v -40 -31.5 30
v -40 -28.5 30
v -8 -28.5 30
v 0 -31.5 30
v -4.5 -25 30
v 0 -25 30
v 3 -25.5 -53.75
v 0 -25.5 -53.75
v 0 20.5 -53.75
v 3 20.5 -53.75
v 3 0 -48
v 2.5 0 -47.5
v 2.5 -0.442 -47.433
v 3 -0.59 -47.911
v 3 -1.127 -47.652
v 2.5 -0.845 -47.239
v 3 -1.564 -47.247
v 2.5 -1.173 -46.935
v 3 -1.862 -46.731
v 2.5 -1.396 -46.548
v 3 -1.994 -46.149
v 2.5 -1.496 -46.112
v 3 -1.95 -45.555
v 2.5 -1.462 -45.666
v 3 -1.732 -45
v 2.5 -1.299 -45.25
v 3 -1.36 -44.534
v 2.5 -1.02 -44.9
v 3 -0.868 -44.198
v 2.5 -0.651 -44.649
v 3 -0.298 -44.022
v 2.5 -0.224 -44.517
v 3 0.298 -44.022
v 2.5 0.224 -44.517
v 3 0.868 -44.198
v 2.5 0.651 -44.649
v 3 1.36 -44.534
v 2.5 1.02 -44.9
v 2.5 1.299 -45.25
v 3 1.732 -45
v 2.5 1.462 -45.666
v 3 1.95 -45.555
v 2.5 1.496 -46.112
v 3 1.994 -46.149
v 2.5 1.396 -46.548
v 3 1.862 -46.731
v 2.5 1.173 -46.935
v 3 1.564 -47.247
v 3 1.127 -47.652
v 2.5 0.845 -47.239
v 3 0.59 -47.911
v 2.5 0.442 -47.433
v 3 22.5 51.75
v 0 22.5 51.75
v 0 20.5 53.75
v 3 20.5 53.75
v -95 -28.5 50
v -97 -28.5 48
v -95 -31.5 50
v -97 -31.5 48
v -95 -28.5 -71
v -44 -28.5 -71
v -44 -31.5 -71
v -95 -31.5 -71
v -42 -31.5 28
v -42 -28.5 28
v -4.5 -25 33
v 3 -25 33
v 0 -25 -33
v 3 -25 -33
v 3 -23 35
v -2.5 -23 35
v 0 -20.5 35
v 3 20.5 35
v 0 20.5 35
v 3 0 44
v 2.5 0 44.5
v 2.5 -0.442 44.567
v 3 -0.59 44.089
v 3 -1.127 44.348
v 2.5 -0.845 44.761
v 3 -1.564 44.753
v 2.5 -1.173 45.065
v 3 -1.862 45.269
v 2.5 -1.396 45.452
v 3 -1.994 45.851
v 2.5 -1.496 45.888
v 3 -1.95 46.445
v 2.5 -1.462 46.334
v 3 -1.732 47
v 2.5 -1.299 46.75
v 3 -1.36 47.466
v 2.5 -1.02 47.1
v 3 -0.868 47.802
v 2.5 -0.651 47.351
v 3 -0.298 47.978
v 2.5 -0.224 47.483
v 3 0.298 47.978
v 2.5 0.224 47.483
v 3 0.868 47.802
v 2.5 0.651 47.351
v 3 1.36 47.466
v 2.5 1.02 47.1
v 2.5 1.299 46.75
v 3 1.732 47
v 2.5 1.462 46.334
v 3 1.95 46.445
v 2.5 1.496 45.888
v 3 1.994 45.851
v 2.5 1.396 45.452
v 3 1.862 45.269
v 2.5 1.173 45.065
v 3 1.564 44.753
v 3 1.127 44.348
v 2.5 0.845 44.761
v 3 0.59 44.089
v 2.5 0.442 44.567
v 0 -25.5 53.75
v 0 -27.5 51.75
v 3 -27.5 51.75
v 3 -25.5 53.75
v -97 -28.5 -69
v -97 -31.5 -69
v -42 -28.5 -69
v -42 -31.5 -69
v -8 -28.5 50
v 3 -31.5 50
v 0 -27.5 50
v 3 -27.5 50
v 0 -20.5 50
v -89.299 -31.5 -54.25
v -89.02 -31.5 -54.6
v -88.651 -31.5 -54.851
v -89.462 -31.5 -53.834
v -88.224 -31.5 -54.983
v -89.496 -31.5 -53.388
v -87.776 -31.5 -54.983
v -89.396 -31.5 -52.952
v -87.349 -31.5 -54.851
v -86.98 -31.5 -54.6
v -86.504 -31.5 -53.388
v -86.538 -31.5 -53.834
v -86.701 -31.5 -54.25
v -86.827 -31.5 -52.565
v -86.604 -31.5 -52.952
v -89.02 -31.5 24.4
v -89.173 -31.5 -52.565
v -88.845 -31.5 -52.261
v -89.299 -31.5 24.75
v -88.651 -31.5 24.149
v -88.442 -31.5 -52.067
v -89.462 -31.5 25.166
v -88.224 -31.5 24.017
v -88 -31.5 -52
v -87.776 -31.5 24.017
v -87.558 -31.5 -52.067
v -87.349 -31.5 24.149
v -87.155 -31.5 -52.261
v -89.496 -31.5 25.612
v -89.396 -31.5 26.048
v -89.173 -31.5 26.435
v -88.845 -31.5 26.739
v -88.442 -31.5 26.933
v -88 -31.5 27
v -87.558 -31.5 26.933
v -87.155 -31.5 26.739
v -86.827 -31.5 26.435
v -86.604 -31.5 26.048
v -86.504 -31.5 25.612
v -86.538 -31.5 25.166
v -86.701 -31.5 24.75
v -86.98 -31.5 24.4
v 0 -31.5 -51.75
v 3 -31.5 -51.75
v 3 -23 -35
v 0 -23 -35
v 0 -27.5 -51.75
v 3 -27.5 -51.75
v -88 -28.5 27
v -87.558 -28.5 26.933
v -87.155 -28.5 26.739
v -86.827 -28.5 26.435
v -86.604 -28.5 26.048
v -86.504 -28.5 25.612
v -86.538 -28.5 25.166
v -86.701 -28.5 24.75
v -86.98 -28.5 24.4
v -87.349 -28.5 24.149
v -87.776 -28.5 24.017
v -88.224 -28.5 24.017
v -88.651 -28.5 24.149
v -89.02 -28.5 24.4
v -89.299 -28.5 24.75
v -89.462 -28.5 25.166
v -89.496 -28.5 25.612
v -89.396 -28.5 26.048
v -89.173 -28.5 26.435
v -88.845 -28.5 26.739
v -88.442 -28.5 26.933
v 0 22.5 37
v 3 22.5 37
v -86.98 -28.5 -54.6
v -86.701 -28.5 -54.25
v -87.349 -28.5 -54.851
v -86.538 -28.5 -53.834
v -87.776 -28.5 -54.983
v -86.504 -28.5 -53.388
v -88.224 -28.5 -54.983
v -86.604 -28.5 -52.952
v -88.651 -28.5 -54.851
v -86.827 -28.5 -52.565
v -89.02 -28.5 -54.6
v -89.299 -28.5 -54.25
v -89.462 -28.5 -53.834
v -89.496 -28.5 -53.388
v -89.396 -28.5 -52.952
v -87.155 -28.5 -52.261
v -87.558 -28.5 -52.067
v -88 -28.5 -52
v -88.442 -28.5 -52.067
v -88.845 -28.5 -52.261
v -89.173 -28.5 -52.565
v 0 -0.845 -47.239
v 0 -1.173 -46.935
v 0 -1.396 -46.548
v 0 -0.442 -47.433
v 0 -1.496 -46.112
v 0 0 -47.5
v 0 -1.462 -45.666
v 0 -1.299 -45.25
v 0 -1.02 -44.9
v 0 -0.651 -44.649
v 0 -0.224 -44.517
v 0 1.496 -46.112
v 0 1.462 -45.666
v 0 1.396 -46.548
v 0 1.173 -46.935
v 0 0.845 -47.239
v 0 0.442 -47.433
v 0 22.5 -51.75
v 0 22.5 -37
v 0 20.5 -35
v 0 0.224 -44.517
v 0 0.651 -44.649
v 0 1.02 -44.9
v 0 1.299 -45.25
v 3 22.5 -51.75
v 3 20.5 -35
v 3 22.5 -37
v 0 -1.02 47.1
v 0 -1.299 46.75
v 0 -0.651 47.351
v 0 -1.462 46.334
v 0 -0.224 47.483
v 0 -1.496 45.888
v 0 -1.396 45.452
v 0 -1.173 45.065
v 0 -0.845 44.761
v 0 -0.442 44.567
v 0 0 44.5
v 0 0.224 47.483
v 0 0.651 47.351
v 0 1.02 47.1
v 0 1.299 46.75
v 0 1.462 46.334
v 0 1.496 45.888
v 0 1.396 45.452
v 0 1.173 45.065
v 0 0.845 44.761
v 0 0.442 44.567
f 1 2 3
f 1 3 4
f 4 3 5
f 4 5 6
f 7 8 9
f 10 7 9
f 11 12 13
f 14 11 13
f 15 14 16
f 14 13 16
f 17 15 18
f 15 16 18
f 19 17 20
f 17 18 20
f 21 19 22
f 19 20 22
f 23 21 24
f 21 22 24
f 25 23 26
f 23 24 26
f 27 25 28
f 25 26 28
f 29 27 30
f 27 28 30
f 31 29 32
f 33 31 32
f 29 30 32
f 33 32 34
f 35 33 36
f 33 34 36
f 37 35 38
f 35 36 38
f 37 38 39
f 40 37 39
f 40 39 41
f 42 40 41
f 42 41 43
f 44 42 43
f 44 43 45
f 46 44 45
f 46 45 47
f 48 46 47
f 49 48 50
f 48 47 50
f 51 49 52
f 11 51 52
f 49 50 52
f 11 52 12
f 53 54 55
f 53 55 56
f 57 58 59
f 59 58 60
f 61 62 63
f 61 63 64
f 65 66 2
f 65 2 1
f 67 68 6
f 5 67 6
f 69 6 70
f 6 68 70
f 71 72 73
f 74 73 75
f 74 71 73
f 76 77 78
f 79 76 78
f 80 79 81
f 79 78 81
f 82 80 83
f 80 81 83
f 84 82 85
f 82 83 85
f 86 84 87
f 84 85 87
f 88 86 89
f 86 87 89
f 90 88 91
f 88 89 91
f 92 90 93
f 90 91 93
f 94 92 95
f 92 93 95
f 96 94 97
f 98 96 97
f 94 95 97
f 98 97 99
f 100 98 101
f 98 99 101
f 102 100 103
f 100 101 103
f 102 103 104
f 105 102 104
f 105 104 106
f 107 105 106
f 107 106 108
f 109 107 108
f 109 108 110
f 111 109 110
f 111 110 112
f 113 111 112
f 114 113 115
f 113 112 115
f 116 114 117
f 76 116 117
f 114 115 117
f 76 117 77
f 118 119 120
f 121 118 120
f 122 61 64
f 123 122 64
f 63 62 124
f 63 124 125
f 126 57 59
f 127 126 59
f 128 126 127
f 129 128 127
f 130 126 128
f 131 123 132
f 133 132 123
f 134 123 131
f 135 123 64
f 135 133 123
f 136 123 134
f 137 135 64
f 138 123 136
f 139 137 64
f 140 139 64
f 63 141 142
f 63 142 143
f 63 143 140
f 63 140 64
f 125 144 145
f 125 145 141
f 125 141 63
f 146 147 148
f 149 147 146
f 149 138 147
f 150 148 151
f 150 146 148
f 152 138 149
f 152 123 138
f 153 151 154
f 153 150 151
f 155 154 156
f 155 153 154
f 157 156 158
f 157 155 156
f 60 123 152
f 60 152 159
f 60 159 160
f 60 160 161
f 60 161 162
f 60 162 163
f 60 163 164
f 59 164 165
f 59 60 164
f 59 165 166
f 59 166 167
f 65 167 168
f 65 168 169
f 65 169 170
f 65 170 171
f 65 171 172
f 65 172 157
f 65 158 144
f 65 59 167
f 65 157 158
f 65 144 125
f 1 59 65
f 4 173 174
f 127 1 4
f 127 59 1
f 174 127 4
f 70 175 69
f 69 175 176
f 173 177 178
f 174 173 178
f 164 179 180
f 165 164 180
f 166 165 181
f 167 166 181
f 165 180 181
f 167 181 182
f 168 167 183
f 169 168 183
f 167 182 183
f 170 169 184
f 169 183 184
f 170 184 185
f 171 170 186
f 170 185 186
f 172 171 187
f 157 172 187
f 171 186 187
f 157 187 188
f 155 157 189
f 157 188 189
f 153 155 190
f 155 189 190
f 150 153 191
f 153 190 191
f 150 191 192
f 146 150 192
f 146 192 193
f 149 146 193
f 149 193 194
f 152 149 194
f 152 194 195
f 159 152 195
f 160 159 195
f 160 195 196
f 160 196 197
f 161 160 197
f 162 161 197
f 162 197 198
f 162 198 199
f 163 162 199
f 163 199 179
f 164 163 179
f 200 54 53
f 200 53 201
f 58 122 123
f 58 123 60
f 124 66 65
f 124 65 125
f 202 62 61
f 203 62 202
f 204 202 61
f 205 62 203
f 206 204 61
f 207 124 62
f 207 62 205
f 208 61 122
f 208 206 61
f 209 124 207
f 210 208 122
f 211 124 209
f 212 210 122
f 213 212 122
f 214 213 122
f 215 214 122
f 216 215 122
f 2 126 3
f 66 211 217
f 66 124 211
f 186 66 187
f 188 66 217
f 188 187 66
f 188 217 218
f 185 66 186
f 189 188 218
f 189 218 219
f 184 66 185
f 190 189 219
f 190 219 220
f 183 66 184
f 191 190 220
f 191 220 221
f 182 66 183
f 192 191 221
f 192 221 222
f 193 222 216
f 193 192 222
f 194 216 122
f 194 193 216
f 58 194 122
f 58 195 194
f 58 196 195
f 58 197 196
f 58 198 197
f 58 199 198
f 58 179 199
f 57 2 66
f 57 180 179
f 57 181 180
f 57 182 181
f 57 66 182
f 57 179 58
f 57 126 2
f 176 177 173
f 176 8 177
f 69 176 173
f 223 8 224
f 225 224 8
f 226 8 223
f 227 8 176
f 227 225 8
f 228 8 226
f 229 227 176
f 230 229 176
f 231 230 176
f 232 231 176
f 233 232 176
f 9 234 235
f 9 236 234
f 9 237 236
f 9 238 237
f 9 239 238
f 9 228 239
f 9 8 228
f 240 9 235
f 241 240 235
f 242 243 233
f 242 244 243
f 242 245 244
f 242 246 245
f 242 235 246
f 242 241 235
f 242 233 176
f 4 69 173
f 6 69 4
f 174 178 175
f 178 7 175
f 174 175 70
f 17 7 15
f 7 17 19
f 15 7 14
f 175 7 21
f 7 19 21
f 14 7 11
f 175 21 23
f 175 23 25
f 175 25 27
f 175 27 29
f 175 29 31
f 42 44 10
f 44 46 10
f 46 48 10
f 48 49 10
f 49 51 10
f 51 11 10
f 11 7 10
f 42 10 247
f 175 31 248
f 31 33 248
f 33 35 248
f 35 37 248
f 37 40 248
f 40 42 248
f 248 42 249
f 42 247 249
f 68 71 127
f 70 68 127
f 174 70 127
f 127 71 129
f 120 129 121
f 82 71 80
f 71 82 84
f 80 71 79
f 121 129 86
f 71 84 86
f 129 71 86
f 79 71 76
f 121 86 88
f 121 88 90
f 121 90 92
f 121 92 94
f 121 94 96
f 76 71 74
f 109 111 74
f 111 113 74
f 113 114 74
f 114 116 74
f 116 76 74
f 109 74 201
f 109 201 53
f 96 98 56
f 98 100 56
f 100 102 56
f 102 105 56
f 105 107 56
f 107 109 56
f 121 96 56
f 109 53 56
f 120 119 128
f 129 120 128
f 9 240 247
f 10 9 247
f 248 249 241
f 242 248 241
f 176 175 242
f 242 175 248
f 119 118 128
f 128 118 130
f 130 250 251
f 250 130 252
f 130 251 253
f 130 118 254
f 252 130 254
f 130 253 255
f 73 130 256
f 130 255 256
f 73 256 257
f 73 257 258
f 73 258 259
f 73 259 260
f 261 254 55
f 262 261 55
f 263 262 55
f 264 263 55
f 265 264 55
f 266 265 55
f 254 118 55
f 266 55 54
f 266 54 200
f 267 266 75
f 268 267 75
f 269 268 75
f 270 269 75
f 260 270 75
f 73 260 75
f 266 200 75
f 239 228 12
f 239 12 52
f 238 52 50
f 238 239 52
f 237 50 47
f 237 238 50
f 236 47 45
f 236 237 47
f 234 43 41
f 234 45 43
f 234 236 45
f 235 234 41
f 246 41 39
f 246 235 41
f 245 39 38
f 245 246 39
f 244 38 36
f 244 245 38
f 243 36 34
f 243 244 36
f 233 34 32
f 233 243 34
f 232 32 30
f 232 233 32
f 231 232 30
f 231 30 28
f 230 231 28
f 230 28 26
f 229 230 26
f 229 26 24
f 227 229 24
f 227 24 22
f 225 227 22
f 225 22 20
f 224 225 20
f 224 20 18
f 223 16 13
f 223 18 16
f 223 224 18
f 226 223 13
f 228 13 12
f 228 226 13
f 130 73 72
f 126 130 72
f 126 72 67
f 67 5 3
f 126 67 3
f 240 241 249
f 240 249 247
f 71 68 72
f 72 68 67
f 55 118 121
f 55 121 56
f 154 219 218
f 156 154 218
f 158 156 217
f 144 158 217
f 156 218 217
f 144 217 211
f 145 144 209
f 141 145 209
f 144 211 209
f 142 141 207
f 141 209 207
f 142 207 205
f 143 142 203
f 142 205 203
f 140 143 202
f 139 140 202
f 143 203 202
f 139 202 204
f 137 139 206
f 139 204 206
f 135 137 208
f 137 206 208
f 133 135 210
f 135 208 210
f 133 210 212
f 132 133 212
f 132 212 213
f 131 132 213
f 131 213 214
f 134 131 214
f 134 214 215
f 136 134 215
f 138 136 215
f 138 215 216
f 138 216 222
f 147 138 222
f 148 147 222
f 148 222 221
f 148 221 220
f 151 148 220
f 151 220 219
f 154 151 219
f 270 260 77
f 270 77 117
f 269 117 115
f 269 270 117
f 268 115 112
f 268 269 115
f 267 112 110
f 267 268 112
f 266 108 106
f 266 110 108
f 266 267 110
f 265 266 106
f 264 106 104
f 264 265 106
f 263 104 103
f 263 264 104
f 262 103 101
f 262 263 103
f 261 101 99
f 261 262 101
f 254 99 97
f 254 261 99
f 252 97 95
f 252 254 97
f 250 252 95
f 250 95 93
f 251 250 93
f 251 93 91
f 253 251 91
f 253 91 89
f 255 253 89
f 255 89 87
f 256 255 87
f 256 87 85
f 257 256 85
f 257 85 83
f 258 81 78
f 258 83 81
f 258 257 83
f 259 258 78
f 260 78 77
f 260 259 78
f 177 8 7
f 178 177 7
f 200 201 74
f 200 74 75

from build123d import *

# Parameters (mm, degrees)
SKETCH_1_W               = 107.5
SKETCH_1_H               = 50
EXTRUDE_1_DEPTH          = 3
CHAMFER_1_SIZE           = 2
CUT_EXTRUDE_1_DEPTH      = 61.450909836
CUT_EXTRUDE_1_DEPTH_BACK = 61.450909836
SKETCH_3_R               = 1.5
CHAMFER_2_SIZE           = 0.5
SKETCH_4_W               = 20
SKETCH_4_H               = 1
EXTRUDE_2_DEPTH          = 3
EXTRUDE_3_DEPTH          = 3
EXTRUDE_4_DEPTH          = 20
SKETCH_7_R               = 1.5
CUT_EXTRUDE_2_DEPTH      = 30
SKETCH_8_W               = 70
SKETCH_8_H               = 47.5
CUT_EXTRUDE_3_DEPTH      = 10
CHAMFER_5_SIZE           = 2
CHAMFER_6_SIZE           = 2
CHAMFER_7_SIZE           = 2
SKETCH_9_W               = 3
SKETCH_9_H               = 81.75
EXTRUDE_5_DEPTH          = 4


with BuildPart() as part:
    # 草图1 → 凸台-拉伸1 (new body)
    with BuildSketch(Plane(origin=(0, 0, 0), x_dir=(0, 0, -1), z_dir=(1, 0, 0))):
        with Locations((0, -2.5)):
            Rectangle(SKETCH_1_W, SKETCH_1_H)
    extrude(amount=EXTRUDE_1_DEPTH)

    # 倒角1
    chamfer_1_edges = [part.edges().sort_by_distance(p)[0] for p in [
        (1.5, 22.5, 53.75),
        (1.5, 22.5, -53.75),
        (1.5, -27.5, -53.75),
        (1.5, -27.5, 53.75),
    ]]
    chamfer(chamfer_1_edges, length=CHAMFER_1_SIZE)

    # 草图3 → 切除-拉伸1 (cut, two sides: drawn at the far end of the back side and taken through both)
    with BuildSketch(Plane(origin=(3, 0, 0), x_dir=(0, 0, -1), z_dir=(1, 0, 0)).offset(-CUT_EXTRUDE_1_DEPTH_BACK)):
        with Locations((46, 0)):
            Circle(SKETCH_3_R)
        with Locations((-46, 0)):
            Circle(SKETCH_3_R)
    extrude(amount=CUT_EXTRUDE_1_DEPTH + CUT_EXTRUDE_1_DEPTH_BACK, mode=Mode.SUBTRACT)

    # 倒角2
    chamfer_2_edges = [part.edges().sort_by_distance(p)[0] for p in [
        (3, 0, -44.5),
        (3, 0, 47.5),
    ]]
    chamfer(chamfer_2_edges, length=CHAMFER_2_SIZE)


with BuildPart() as body_2:
    # 草图4 → 凸台-拉伸2 (new body)
    with BuildSketch(Plane(origin=(3, 0, 0), x_dir=(0, 0, -1), z_dir=(1, 0, 0))):
        with Locations((-40, -28)):
            Rectangle(SKETCH_4_W, SKETCH_4_H)
    extrude(amount=-EXTRUDE_2_DEPTH)

    # 草图5 → 凸台-拉伸3 (add)
    with BuildSketch(Plane.XZ.offset(28.5)):
        Polygon((3, 50), (3, 30), (-42, 30), (-42, -71), (-97, -71), (-97, 50), align=None)
    extrude(amount=EXTRUDE_3_DEPTH)

    # 草图6 → 凸台-拉伸4 (add)
    with BuildSketch(Plane(origin=(0, 0, 30), x_dir=(-1, 0, 0), z_dir=(0, 0, -1))):
        Polygon((0, -20.5), (8, -28.5), (0, -28.5), align=None)
    extrude(amount=-EXTRUDE_4_DEPTH)

    # 草图7 → 切除-拉伸2 (cut)
    with BuildSketch(Plane(origin=(0, -28.5, 0), x_dir=(1, 0, 0), z_dir=(0, 1, 0))):
        with Locations(Location((-88, 53.5, 0), (0, 0, 270))):
            Circle(SKETCH_7_R)
        with Locations(Location((-88, -25.5, 0), (0, 0, 270))):
            Circle(SKETCH_7_R)
    extrude(amount=-CUT_EXTRUDE_2_DEPTH, mode=Mode.SUBTRACT)


with BuildPart() as part_1:
    add(part.part)

    # Combine 1: union body 2
    add(body_2.part)

    # 草图8 → 切除-拉伸3 (cut)
    with BuildSketch(Plane(origin=(3, 0, 0), x_dir=(0, 0, -1), z_dir=(1, 0, 0))):
        with Locations((0, -1.25)):
            Rectangle(SKETCH_8_W, SKETCH_8_H)
    extrude(amount=-CUT_EXTRUDE_3_DEPTH, mode=Mode.SUBTRACT)

    # 倒角5
    chamfer_5_edges = [part_1.edges().sort_by_distance(p)[0] for p in [
        (-0.75, -25, 35),
        (1.5, -25, -35),
    ]]
    chamfer(chamfer_5_edges, length=CHAMFER_5_SIZE)

    # 倒角6
    chamfer_6_edges = [part_1.edges().sort_by_distance(p)[0] for p in [
        (1.5, 22.5, 35),
        (1.5, 22.5, -35),
    ]]
    chamfer(chamfer_6_edges, length=CHAMFER_6_SIZE)

    # 倒角7
    chamfer_7_edges = [part_1.edges().sort_by_distance(p)[0] for p in [
        (-42, -30, 30),
        (-97, -30, 50),
        (-97, -30, -71),
        (-42, -30, -71),
    ]]
    chamfer(chamfer_7_edges, length=CHAMFER_7_SIZE)

    # 草图9 → 凸台-拉伸5 (add)
    with BuildSketch(Plane.XZ.offset(27.5)):
        with Locations((1.5, -10.875)):
            Rectangle(SKETCH_9_W, SKETCH_9_H)
    extrude(amount=EXTRUDE_5_DEPTH)


solid = part_1.part
